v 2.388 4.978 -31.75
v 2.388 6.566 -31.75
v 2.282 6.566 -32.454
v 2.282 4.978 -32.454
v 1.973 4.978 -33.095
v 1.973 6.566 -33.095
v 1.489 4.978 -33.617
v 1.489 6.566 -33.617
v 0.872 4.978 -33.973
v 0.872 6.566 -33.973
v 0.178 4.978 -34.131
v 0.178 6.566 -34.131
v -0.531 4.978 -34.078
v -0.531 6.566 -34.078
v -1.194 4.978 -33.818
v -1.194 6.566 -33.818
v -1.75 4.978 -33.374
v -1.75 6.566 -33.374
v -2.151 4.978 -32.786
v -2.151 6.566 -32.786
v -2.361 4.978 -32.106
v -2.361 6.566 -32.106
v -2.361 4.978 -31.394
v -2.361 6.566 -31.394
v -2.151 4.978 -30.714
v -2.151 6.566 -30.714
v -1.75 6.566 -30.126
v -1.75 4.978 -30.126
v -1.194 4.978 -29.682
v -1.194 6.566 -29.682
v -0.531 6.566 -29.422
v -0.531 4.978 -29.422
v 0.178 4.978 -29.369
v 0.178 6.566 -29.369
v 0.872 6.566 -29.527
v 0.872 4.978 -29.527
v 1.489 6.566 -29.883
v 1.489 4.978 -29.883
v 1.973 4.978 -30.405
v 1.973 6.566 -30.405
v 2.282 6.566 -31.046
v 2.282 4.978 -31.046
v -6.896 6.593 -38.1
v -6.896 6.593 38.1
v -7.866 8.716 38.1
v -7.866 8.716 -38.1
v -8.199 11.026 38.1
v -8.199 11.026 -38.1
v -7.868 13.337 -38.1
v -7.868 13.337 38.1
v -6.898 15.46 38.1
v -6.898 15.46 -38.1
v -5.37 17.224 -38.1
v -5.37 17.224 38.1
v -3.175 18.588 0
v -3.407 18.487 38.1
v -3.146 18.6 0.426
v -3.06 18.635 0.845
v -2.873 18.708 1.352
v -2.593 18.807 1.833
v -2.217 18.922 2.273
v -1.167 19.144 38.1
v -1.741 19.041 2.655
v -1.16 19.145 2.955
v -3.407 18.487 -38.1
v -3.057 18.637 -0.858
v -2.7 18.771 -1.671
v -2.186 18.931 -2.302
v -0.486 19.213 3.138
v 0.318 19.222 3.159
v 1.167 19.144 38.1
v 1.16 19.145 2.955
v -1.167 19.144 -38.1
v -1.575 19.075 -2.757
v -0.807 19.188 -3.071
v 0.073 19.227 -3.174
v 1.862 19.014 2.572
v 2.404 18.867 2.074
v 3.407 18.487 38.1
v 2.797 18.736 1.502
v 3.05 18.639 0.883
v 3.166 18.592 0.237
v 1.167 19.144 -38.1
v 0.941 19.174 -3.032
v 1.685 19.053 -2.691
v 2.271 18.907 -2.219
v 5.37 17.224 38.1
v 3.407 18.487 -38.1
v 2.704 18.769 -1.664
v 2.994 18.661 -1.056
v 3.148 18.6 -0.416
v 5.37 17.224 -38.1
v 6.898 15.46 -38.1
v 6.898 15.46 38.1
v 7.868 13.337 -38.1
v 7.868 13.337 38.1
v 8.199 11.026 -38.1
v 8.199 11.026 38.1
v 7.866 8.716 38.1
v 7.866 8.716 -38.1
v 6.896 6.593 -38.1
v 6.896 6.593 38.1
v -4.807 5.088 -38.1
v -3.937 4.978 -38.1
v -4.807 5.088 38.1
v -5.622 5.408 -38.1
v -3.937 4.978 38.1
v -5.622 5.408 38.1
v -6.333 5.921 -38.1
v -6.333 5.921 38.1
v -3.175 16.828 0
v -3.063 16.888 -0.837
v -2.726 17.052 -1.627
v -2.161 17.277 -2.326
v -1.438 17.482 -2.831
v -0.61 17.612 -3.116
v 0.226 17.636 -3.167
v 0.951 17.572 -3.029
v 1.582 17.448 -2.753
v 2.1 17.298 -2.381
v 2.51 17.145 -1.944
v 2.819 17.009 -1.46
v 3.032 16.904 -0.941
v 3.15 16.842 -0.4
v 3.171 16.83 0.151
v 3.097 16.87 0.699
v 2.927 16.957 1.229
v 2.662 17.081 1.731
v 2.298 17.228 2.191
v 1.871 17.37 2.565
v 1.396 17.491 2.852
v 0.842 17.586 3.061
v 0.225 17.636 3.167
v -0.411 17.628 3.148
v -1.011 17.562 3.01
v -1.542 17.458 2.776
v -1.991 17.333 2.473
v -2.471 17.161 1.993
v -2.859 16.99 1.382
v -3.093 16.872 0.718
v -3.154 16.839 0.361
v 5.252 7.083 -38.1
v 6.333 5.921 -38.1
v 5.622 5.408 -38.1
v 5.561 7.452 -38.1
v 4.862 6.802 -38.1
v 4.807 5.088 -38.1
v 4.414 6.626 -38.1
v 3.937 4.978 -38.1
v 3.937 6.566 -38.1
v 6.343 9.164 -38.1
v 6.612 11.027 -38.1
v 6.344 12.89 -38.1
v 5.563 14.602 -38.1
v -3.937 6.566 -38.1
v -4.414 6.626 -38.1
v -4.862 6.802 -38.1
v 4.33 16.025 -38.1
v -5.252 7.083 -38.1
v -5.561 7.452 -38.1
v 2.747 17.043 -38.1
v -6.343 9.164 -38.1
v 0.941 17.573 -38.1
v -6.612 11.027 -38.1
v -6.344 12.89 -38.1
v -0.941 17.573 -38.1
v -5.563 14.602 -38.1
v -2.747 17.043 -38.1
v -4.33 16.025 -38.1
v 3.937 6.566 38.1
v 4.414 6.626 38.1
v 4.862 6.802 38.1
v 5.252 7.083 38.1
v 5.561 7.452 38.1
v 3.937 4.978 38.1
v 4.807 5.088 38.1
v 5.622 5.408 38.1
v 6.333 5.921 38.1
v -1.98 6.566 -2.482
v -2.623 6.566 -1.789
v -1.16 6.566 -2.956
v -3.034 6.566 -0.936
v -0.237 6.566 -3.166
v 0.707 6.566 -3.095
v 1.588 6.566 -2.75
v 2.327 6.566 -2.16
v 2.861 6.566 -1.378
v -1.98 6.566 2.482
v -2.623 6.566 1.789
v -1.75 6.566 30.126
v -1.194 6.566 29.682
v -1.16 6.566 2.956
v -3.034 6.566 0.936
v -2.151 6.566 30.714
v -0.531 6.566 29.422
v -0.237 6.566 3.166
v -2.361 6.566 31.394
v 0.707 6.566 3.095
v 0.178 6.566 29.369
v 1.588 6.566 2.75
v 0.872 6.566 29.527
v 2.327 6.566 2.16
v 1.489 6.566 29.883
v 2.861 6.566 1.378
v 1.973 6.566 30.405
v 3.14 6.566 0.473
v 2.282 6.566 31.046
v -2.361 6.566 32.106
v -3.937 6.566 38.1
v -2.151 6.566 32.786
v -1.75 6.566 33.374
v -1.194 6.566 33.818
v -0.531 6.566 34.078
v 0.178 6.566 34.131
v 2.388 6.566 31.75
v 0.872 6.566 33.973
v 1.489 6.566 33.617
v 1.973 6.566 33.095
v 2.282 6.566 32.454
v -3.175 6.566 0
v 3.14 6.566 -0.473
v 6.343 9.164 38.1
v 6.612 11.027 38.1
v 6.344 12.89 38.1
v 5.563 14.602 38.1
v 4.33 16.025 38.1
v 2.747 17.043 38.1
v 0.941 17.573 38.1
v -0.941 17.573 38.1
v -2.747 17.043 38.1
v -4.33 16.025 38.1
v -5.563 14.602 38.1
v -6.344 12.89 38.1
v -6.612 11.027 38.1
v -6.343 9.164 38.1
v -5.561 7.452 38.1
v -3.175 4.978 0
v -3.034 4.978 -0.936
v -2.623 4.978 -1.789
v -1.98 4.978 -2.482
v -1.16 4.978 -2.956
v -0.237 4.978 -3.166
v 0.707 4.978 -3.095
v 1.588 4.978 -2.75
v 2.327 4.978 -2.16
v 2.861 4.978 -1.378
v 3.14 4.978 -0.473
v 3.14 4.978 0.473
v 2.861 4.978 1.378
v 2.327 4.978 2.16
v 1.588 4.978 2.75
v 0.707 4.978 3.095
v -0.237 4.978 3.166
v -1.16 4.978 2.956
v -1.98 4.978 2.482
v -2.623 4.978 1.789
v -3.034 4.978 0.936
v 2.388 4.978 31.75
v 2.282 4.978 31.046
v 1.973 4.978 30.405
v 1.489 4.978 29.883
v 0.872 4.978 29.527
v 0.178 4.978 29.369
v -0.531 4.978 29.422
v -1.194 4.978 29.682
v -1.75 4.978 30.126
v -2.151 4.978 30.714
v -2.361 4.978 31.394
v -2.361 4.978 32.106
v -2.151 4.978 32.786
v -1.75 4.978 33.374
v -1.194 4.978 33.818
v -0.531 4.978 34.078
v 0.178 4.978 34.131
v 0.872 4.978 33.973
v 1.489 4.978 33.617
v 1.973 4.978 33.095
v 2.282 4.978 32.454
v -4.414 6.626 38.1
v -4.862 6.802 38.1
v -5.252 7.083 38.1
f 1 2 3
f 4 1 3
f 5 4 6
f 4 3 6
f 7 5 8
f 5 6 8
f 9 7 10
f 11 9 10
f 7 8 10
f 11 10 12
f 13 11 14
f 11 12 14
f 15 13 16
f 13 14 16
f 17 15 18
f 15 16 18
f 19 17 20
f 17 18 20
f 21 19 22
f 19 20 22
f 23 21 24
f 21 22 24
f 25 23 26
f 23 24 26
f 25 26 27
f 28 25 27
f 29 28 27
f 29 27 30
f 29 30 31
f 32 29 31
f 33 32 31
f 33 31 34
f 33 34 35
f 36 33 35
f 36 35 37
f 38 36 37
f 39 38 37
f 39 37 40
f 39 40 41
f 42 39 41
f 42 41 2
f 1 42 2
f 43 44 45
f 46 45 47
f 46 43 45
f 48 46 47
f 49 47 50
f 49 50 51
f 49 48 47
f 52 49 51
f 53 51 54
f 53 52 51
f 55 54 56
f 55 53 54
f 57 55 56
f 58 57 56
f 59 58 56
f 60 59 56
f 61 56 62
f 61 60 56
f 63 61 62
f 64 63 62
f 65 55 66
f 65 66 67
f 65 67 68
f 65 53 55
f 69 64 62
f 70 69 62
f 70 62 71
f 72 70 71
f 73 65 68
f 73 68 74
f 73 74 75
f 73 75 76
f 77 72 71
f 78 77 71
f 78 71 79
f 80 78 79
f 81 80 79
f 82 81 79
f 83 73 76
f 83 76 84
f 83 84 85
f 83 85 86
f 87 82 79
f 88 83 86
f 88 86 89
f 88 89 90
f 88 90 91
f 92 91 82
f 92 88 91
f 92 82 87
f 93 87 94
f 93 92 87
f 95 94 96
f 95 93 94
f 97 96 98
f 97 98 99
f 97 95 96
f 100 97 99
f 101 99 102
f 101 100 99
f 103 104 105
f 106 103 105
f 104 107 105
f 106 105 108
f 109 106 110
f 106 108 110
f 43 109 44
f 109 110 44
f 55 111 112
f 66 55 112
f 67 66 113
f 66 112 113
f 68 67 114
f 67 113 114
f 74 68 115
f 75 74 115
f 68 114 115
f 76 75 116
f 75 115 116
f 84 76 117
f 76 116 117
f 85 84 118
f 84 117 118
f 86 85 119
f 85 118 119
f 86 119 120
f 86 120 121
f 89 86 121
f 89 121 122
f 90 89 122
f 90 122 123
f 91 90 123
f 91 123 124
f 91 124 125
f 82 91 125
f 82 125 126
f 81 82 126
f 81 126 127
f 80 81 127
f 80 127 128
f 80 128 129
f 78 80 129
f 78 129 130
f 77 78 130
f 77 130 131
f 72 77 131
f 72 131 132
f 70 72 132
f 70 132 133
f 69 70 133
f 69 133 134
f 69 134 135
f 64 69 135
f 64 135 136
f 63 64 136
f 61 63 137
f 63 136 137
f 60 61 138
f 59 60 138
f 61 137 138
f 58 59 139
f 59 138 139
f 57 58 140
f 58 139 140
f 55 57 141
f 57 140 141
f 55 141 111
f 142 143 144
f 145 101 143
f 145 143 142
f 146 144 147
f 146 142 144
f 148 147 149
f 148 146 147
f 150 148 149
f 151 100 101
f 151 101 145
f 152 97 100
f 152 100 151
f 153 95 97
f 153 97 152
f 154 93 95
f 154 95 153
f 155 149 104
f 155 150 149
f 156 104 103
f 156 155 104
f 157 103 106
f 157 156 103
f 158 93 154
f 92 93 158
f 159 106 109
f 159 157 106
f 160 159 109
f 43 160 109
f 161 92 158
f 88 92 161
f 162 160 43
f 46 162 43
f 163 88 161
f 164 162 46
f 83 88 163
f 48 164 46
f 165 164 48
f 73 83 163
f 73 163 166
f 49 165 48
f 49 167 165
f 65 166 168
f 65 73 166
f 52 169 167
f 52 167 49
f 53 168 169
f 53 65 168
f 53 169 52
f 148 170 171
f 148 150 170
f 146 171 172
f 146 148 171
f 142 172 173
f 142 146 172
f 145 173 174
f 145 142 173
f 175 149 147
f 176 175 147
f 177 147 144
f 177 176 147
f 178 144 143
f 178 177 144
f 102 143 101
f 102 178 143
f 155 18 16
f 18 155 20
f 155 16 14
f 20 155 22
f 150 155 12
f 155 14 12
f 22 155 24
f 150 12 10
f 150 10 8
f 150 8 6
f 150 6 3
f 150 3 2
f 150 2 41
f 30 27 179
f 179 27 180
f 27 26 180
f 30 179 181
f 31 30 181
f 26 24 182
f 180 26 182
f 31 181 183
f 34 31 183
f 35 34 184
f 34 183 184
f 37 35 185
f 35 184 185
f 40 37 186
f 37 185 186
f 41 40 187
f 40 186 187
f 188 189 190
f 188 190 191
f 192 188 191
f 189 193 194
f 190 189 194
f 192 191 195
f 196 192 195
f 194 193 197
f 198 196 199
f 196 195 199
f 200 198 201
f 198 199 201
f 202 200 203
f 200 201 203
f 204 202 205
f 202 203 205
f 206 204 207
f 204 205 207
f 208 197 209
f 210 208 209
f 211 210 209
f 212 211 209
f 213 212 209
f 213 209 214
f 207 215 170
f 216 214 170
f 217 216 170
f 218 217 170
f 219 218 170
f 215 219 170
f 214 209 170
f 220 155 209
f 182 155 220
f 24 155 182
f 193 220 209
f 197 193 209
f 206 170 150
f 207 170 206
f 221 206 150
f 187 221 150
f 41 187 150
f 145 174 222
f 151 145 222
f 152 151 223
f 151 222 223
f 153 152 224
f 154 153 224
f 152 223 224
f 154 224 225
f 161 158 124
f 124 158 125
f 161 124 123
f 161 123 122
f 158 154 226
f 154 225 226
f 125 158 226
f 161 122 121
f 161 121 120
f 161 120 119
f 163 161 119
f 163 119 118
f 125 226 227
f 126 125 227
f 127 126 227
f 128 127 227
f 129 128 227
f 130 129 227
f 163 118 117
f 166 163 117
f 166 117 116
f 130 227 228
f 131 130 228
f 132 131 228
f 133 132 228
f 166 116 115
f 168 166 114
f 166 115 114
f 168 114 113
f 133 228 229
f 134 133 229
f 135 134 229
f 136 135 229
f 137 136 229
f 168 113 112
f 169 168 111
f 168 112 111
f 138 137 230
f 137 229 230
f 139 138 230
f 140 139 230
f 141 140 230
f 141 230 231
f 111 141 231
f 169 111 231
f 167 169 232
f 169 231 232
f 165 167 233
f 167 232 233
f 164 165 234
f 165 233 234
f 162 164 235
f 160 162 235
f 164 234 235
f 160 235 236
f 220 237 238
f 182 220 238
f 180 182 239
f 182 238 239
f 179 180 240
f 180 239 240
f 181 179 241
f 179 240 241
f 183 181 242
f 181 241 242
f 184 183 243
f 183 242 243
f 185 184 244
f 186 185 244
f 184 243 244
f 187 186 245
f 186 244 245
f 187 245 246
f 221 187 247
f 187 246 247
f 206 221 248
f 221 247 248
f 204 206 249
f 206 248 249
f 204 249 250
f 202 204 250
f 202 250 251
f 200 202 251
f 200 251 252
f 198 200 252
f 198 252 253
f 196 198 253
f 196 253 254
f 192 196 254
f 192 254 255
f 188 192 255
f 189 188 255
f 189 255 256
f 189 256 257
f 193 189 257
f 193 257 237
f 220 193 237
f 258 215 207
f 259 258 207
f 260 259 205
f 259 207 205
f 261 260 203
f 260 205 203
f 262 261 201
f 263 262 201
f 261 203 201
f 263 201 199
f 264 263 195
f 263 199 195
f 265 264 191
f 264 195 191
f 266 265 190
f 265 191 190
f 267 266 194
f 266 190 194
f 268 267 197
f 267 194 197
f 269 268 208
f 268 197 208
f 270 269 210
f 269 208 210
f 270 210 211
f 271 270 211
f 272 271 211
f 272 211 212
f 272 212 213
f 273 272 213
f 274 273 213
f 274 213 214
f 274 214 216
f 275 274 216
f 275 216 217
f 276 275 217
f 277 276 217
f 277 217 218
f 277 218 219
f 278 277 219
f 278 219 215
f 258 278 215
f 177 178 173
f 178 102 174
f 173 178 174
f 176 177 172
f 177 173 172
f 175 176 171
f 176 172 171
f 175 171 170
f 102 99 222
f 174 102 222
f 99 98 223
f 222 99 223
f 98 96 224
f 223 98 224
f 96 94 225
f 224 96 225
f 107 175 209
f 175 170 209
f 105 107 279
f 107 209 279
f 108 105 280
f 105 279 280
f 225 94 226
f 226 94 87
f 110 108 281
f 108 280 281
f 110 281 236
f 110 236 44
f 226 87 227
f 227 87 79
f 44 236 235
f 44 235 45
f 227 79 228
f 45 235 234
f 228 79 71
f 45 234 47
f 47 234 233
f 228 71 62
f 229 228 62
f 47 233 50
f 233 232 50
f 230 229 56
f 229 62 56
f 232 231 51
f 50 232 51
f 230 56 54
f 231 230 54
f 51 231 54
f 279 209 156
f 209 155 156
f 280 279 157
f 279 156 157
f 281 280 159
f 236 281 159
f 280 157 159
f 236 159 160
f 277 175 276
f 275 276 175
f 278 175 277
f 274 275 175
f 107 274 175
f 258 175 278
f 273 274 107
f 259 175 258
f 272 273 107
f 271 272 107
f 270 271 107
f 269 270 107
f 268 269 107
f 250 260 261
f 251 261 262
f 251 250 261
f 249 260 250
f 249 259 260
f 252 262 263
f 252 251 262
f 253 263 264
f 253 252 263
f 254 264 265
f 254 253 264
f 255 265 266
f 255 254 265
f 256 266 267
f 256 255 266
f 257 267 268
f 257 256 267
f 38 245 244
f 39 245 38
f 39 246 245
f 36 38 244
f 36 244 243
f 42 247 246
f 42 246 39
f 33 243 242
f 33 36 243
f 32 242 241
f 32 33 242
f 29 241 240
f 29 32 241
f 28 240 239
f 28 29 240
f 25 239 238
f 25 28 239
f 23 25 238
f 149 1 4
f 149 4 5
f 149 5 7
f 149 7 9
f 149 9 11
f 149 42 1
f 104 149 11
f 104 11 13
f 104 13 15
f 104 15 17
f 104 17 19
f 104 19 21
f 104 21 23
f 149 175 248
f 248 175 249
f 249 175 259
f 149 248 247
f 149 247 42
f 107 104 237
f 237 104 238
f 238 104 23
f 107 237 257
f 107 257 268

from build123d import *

# Parameters (mm, degrees)
BOSS_EXTRUDE1_DEPTH      = 76.2
CUT_EXTRUDE1_DEPTH       = 77.2
M4_CLEARANCE_HOLE1_D     = 4.7752
M4_CLEARANCE_HOLE1_DEPTH = 1.5875
HOLE1_D                  = 6.35
HOLE1_DEPTH              = 14.2494
FILLET1_R                = 1.9304
FILLET2_R                = 3.5179


with BuildPart() as part:
    # Sketch1 → Boss-Extrude1 (new body)
    with BuildSketch(Plane(origin=(0, 0, -38.1), x_dir=(-1, 0, 0), z_dir=(0, 0, -1))):
        with BuildLine():
            Line((-5.533344062, 4.9784), (5.533344062, 4.9784))
            ThreePointArc((5.533344062, 4.9784), (0, 19.2278), (-5.533344062, 4.9784))
        make_face()
    extrude(amount=-BOSS_EXTRUDE1_DEPTH)

    # Sketch2 → Cut-Extrude1 (cut, through all)
    with BuildSketch(Plane.XY.offset(38.1)):
        with BuildLine():
            Line((-4.878086413, 6.5659), (4.878086413, 6.5659))
            ThreePointArc((4.878086413, 6.5659), (0, 17.6403), (-4.878086413, 6.5659))
        make_face()
    extrude(amount=-CUT_EXTRUDE1_DEPTH, mode=Mode.SUBTRACT)

    # M4 Clearance Hole1
    with Locations(Plane(origin=(0, 4.9784, 0), x_dir=(-1, 0, 0), z_dir=(0, -1, 0))):
        with Locations((0, 0), (0, 31.75), (0, -31.75)):
            Hole(M4_CLEARANCE_HOLE1_D / 2, depth=M4_CLEARANCE_HOLE1_DEPTH)

    # Hole1
    with Locations(Plane(origin=(0, 19.2278, 0), x_dir=(1, 0, 0), z_dir=(0, 1, 0))):
        with Locations((0, 0)):
            Hole(HOLE1_D / 2, depth=HOLE1_DEPTH)

    # Fillet1
    fillet1_edges = [part.edges().sort_by_distance(p)[0] for p in [
        (-4.878086413, 6.5659, 0),
        (4.878086413, 6.5659, 0),
    ]]
    fillet(fillet1_edges, radius=FILLET1_R)

    # Fillet2
    fillet2_edges = [part.edges().sort_by_distance(p)[0] for p in [
        (-5.533344062, 4.9784, 0),
        (5.533344062, 4.9784, 0),
    ]]
    fillet(fillet2_edges, radius=FILLET2_R)


solid = part.part
